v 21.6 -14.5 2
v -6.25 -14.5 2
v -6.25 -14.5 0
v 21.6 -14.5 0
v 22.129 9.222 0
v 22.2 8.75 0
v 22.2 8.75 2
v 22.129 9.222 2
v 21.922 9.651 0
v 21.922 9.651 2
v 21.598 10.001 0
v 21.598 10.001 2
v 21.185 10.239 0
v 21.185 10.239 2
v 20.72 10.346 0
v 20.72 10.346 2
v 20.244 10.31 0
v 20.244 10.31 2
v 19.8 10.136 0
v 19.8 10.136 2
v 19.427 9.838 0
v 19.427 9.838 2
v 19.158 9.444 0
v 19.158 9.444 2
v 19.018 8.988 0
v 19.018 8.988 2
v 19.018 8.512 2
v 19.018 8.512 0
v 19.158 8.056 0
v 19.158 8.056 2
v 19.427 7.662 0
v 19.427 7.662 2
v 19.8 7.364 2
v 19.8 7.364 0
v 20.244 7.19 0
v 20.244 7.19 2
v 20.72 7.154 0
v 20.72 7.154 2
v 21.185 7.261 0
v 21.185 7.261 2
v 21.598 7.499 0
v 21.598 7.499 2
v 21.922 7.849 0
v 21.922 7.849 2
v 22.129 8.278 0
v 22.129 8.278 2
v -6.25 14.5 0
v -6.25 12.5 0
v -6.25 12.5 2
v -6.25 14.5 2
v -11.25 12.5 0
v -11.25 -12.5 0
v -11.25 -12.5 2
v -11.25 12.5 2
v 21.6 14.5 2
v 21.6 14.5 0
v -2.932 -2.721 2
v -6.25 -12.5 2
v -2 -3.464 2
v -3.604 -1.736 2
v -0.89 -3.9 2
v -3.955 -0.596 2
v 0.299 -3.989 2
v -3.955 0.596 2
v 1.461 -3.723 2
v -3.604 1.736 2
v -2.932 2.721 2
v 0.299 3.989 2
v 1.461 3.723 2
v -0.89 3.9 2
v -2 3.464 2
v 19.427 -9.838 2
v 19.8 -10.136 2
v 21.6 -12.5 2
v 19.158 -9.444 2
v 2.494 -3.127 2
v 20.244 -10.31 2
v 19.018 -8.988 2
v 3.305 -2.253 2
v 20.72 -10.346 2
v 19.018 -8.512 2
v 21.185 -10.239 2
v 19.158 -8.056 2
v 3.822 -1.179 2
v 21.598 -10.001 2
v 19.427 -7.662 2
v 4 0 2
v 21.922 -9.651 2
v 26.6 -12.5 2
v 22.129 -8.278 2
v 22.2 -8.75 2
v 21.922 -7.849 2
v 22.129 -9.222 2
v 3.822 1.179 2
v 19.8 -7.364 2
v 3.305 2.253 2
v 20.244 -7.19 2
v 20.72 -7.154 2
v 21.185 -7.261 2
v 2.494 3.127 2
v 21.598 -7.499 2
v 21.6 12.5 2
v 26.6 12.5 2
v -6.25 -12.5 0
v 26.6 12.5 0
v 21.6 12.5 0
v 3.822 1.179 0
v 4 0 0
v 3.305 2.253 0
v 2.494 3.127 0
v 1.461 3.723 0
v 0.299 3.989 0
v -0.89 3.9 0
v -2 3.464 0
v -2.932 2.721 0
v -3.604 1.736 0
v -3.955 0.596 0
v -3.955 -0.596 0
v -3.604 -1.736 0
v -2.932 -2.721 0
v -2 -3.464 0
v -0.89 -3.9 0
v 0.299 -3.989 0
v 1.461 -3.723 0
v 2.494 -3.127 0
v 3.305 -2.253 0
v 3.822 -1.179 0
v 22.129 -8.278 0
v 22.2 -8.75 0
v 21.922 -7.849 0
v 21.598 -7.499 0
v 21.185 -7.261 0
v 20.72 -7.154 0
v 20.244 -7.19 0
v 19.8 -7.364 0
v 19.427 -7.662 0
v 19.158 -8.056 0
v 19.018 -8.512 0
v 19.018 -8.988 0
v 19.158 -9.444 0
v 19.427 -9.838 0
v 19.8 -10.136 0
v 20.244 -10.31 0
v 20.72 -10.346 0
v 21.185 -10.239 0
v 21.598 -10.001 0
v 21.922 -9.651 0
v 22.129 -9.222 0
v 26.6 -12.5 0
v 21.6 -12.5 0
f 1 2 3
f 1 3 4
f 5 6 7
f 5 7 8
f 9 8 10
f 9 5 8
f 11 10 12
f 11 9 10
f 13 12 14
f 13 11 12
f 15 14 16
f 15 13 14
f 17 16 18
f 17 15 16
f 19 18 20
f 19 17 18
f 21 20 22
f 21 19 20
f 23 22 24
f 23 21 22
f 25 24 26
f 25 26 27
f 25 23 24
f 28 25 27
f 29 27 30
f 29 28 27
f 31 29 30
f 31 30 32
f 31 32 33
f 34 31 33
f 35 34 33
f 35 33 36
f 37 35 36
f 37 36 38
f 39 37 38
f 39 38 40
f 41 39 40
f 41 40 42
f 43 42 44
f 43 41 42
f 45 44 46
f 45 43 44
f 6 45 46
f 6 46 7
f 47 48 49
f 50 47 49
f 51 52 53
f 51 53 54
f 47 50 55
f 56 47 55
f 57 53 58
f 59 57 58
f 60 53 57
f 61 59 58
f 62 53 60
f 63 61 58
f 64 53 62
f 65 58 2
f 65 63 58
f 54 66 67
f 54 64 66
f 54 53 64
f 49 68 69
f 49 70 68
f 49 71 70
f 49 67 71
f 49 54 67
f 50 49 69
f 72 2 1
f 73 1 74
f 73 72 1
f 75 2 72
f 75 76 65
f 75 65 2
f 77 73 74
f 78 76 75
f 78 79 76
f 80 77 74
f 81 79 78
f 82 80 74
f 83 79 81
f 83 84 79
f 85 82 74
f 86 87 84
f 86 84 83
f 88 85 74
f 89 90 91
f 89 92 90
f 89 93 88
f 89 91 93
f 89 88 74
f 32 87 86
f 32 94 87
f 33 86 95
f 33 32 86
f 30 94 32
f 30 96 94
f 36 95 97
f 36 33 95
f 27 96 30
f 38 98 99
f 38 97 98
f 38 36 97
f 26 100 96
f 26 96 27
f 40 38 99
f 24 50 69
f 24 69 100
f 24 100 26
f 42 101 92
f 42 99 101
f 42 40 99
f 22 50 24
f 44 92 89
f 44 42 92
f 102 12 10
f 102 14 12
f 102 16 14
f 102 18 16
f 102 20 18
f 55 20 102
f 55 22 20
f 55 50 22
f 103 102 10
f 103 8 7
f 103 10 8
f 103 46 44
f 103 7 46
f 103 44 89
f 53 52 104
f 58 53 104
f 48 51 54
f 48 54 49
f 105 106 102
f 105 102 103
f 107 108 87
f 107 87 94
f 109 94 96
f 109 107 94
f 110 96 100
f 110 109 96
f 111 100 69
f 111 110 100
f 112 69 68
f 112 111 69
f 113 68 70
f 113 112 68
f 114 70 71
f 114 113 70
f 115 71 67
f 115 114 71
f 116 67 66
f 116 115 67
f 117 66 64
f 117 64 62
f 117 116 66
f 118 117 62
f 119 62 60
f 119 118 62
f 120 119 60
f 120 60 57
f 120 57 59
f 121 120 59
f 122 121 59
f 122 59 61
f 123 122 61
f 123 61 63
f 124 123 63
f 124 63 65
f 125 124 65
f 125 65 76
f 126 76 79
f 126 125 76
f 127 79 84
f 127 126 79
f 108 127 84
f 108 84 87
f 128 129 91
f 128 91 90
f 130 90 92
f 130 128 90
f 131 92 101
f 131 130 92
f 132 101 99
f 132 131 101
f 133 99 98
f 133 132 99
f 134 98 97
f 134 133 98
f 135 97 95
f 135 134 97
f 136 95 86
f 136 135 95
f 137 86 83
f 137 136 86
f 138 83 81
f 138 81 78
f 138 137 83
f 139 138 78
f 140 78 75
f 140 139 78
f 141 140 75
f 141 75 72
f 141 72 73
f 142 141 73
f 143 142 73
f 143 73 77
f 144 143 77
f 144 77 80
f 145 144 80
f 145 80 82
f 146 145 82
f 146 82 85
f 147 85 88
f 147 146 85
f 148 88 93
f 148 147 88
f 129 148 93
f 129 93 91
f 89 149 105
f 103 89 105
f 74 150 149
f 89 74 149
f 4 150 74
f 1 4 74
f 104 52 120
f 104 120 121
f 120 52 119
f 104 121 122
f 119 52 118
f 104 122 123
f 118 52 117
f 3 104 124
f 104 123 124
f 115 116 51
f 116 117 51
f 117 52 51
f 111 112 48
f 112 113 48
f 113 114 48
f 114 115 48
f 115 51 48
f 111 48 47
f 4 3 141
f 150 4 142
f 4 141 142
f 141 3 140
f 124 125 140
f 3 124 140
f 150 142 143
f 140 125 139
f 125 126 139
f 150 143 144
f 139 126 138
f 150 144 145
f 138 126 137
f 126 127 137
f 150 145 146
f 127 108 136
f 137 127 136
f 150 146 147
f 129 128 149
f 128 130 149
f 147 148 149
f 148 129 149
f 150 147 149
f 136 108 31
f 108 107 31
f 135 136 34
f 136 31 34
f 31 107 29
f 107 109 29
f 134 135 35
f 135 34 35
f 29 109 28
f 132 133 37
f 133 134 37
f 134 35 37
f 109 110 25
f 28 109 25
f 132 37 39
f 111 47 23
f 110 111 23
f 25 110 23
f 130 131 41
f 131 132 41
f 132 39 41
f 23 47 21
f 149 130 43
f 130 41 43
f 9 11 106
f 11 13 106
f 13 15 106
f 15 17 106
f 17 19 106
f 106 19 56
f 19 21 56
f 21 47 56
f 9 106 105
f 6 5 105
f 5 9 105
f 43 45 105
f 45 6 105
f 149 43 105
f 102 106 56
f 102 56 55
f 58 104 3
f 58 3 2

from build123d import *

# Parameters (mm, degrees)
IZIM1_W                     = 37.85
IZIM1_H                     = 25
IZIM1_R                     = 1.6
IZIM1_R_2                   = 4
Y_KSEKLIK_EKSTR_ZYON1_DEPTH = 2
IZIM2_W                     = 27.85
IZIM2_H                     = 2
Y_KSEKLIK_EKSTR_ZYON2_DEPTH = 2


with BuildPart() as part:
    # Çizim1 → Yükseklik-Ekstrüzyon1 (new body)
    with BuildSketch(Plane.XY):
        with Locations((7.675, 0)):
            Rectangle(IZIM1_W, IZIM1_H)
        with Locations((20.6, -8.75)):
            Circle(IZIM1_R, mode=Mode.SUBTRACT)
        with Locations((20.6, 8.75)):
            Circle(IZIM1_R, mode=Mode.SUBTRACT)
        Circle(IZIM1_R_2, mode=Mode.SUBTRACT)
    extrude(amount=Y_KSEKLIK_EKSTR_ZYON1_DEPTH)

    # Çizim2 → Yükseklik-Ekstrüzyon2 (add)
    with BuildSketch(Plane.XZ.offset(12.5)):
        with Locations((7.675, 1)):
            Rectangle(IZIM2_W, IZIM2_H)
    y_kseklik_ekstr_zyon2 = extrude(amount=Y_KSEKLIK_EKSTR_ZYON2_DEPTH)

    # Aynalama1: Yükseklik-Ekstrüzyon2 across plane
    add(y_kseklik_ekstr_zyon2.mirror(Plane.ZX))


solid = part.part
